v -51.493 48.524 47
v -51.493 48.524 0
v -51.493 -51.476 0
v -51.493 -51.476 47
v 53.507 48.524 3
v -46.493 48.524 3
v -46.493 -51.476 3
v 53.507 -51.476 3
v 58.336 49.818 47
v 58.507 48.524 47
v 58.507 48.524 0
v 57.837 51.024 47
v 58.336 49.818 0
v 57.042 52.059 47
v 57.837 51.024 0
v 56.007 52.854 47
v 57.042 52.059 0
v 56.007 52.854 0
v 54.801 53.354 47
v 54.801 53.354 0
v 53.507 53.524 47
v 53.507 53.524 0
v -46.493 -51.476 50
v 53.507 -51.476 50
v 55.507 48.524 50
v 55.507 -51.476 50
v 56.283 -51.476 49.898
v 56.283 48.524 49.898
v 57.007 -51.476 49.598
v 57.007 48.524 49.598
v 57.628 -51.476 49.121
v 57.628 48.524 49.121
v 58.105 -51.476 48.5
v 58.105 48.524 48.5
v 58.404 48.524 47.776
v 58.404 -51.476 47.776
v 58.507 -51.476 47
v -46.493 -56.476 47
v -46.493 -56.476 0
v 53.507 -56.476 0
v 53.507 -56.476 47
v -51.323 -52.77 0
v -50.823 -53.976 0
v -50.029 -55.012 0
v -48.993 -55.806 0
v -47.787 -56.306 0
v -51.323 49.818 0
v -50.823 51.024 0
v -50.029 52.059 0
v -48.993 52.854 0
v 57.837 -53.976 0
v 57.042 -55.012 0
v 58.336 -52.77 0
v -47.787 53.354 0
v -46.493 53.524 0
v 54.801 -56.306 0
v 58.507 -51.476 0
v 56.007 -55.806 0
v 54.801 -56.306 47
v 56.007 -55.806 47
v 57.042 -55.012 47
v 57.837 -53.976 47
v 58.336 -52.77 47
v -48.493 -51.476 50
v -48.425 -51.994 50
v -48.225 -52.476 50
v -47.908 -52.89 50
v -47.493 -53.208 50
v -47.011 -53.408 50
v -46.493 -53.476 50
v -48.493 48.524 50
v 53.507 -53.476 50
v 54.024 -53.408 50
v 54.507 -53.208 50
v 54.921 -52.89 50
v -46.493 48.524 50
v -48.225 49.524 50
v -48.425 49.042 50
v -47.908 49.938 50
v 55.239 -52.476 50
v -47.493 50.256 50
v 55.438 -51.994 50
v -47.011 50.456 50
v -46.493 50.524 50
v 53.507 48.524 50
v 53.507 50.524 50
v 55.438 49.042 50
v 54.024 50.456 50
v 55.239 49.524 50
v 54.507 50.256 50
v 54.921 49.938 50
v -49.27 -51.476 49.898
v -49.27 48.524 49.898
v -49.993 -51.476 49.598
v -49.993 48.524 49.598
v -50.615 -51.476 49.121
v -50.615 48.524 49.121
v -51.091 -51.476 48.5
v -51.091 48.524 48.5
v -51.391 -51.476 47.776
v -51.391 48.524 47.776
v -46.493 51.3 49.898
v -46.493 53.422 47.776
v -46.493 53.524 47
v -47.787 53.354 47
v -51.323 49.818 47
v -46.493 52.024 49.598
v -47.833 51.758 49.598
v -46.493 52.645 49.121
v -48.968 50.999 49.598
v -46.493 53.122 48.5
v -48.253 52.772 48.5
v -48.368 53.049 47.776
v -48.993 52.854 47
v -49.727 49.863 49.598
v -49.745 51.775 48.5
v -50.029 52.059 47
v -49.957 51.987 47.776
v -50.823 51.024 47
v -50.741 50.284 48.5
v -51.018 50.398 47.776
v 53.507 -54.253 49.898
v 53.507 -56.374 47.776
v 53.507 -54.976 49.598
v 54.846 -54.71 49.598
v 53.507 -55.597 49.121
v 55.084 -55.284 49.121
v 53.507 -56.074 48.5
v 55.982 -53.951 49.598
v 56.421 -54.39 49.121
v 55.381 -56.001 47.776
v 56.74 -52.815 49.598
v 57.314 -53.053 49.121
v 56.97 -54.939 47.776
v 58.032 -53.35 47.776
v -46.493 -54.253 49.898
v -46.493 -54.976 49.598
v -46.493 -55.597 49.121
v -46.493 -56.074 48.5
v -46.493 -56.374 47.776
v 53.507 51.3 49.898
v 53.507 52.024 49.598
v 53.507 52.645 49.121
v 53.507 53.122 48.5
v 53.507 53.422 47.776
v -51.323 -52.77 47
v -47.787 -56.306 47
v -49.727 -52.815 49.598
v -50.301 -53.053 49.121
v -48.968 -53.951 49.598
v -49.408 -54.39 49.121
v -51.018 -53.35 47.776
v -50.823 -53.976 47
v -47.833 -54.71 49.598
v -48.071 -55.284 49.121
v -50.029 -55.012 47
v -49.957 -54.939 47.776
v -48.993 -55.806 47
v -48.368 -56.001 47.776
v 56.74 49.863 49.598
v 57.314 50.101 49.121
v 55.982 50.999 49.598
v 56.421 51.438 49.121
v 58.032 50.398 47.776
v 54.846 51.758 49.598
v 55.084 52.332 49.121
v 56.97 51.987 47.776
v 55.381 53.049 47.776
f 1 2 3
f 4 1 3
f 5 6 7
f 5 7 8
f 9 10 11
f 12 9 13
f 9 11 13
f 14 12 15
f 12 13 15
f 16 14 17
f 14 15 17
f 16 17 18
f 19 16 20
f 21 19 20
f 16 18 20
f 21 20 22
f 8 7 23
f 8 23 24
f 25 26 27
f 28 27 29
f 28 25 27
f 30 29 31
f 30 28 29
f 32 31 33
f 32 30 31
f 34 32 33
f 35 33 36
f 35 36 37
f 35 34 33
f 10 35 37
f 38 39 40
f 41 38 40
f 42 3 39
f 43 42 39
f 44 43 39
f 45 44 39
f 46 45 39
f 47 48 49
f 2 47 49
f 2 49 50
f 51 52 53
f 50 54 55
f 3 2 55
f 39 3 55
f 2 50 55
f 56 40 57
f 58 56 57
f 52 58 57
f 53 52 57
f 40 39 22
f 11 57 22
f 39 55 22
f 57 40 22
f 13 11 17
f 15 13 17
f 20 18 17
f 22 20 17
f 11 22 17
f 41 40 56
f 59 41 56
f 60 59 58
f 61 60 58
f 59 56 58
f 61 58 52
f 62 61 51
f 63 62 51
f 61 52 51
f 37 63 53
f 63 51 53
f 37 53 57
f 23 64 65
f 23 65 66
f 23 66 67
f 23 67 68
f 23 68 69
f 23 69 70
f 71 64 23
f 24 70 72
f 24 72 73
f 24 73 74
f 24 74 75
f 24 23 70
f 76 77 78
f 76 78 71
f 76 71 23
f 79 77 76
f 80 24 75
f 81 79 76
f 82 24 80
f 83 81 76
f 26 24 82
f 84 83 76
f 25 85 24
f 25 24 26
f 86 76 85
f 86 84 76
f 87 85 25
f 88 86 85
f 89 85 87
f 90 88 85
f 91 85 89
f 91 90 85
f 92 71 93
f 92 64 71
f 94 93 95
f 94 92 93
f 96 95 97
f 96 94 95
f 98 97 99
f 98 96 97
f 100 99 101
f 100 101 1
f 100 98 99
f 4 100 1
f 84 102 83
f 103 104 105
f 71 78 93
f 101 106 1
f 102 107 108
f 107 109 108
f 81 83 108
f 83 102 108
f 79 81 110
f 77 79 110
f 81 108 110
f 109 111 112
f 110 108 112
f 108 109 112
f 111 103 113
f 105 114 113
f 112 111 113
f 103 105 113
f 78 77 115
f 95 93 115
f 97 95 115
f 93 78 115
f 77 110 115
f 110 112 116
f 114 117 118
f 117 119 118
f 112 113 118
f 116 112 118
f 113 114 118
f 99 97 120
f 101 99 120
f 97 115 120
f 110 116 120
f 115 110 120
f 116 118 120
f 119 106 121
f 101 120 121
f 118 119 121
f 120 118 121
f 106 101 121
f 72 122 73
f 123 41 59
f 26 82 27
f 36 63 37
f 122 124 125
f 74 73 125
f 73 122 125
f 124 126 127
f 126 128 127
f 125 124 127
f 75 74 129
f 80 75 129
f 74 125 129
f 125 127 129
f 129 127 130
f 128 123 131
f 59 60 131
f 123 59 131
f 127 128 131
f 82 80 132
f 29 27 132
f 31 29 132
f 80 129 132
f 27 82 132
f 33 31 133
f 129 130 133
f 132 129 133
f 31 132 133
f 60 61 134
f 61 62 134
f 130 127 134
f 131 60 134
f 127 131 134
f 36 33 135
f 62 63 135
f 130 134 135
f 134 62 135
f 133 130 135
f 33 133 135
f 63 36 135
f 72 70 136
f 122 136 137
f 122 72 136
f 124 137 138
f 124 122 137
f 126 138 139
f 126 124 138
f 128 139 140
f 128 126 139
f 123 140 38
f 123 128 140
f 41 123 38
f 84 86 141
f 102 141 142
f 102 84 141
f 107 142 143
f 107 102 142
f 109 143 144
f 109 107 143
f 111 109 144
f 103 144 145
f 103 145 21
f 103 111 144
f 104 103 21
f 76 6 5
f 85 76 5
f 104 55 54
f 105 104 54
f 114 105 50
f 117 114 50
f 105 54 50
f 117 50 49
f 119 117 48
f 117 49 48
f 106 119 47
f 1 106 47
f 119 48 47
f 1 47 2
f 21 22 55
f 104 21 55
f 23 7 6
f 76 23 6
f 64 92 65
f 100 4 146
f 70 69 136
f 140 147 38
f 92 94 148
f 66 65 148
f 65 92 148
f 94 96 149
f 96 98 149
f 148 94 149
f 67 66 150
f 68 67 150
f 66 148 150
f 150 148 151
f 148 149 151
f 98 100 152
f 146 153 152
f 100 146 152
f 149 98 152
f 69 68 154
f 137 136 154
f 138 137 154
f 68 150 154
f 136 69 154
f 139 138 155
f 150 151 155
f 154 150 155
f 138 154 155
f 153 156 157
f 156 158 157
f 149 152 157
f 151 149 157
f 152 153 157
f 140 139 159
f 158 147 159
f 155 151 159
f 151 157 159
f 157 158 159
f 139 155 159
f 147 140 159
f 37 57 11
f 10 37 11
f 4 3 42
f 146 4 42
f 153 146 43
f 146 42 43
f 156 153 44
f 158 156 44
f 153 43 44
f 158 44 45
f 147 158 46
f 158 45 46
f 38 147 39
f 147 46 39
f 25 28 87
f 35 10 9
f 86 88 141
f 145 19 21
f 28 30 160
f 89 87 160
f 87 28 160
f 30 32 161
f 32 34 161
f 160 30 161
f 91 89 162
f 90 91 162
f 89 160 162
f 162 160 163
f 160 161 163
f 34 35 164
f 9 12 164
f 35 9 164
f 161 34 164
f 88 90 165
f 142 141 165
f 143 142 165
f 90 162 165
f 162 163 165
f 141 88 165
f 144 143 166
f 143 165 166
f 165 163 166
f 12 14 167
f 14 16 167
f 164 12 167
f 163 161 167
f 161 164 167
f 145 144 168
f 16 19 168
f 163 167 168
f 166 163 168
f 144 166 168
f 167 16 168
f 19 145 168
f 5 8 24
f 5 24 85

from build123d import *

# Parameters (mm, degrees)
F0_W     = 100
F0_H     = 100
F1_DEPTH = 3
F2_DEPTH = 50
F3_R     = 3


with BuildPart() as f1:
    # F0 (on Top) → F1 (new body)
    with BuildSketch(Plane.XY):
        with Locations((3.506646, -1.476071)):
            Rectangle(F0_W, F0_H)
    extrude(amount=F1_DEPTH)

    # F0 (on Top) → F2 (join)
    with BuildSketch(Plane.XY):
        with BuildLine():
            Line((53.506646, 53.523929), (-46.493354, 53.523929))
            ThreePointArc((-46.493354, 53.523929), (-50.028888, 52.059462), (-51.493354, 48.523929))
            Line((-51.493354, 48.523929), (-51.493354, -51.476071))
            ThreePointArc((-51.493354, -51.476071), (-50.028888, -55.011605), (-46.493354, -56.476071))
            Line((-46.493354, -56.476071), (53.506646, -56.476071))
            ThreePointArc((53.506646, -56.476071), (57.04218, -55.011605), (58.506646, -51.476071))
            Line((58.506646, -51.476071), (58.506646, 48.523929))
            ThreePointArc((58.506646, 48.523929), (57.04218, 52.059462), (53.506646, 53.523929))
        make_face()
        with Locations((3.506646, -1.476071)):
            Rectangle(F0_W, F0_H, mode=Mode.SUBTRACT)
    extrude(amount=F2_DEPTH)

    # F3
    f3_edges = [f1.edges().sort_by_distance(p)[0] for p in [
        (-51.493354, -1.476071, 50),
    ]]
    fillet(f3_edges, radius=F3_R)


solid = f1.part
